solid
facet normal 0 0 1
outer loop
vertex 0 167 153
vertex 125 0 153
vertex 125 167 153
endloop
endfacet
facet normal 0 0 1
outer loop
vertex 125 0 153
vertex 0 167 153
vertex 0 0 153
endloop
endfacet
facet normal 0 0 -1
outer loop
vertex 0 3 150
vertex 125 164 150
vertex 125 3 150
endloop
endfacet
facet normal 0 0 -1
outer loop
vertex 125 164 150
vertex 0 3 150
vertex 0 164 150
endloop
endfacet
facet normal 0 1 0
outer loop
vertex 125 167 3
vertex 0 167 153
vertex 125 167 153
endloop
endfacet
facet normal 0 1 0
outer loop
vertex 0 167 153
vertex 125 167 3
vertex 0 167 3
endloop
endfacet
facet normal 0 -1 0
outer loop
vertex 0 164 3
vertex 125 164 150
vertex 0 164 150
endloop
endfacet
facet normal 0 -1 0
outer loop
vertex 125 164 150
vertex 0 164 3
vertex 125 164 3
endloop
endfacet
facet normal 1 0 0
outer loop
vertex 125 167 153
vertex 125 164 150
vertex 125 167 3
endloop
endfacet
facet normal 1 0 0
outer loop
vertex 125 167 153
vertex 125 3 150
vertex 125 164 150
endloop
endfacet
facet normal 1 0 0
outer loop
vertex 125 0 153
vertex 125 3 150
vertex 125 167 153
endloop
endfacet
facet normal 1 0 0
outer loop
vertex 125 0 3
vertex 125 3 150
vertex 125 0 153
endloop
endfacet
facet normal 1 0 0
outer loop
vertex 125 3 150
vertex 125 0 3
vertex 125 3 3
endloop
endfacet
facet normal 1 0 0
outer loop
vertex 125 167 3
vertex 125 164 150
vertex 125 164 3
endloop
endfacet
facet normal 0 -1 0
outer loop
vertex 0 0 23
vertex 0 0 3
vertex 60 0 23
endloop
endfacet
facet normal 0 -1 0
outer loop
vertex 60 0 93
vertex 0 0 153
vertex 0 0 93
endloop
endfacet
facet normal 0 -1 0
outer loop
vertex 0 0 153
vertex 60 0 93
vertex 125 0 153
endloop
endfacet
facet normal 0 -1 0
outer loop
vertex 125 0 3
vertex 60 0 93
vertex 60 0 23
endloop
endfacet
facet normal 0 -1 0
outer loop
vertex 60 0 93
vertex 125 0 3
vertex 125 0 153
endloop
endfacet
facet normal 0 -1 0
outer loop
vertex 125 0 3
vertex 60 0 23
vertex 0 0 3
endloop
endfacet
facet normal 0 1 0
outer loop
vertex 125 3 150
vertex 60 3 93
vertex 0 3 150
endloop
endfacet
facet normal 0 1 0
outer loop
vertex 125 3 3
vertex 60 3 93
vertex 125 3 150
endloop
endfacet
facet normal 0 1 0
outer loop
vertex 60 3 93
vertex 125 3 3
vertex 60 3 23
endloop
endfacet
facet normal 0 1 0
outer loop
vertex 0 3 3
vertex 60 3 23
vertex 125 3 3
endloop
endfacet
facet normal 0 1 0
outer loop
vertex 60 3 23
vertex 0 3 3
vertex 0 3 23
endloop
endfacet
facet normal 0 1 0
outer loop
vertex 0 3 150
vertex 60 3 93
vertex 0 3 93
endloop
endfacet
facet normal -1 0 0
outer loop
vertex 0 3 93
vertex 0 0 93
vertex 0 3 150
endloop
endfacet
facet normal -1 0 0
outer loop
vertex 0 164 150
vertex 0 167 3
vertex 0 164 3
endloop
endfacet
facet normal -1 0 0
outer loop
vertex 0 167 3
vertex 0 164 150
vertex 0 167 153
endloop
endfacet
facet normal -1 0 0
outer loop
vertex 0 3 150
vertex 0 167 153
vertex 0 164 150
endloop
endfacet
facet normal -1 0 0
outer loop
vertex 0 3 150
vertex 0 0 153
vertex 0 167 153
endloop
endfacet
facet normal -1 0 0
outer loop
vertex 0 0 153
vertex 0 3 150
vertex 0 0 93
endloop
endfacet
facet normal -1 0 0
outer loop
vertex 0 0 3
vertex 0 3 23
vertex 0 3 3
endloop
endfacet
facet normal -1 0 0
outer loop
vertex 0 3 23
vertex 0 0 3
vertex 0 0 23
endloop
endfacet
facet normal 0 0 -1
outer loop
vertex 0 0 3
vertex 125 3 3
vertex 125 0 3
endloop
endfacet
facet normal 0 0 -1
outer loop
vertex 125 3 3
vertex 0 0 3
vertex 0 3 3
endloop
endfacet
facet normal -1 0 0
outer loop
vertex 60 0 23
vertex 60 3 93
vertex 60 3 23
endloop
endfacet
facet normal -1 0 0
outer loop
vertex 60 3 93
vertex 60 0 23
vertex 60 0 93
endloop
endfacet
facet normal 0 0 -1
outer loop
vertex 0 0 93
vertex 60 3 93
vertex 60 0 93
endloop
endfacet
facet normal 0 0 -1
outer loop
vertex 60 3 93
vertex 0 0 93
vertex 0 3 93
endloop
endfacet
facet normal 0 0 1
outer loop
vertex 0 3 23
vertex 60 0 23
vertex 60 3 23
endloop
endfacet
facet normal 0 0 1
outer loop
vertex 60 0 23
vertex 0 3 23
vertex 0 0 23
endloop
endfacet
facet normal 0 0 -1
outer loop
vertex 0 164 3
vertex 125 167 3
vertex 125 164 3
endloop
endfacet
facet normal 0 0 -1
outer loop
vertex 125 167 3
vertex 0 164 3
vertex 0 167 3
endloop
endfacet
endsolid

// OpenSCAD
include <lasercut.scad>; 

$fn = 60;

// The wood thickness
thickness = 3.0;


X = 125;
Y = 167;
Z = 150;


color("Gold",0.75)
lasercutoutBox(thickness=thickness, x=X, y=Y, z=Z, sides=3, num_fingers=4,
    cutouts_a = [[], [], [[0, 20, 60, 70]]]
);
